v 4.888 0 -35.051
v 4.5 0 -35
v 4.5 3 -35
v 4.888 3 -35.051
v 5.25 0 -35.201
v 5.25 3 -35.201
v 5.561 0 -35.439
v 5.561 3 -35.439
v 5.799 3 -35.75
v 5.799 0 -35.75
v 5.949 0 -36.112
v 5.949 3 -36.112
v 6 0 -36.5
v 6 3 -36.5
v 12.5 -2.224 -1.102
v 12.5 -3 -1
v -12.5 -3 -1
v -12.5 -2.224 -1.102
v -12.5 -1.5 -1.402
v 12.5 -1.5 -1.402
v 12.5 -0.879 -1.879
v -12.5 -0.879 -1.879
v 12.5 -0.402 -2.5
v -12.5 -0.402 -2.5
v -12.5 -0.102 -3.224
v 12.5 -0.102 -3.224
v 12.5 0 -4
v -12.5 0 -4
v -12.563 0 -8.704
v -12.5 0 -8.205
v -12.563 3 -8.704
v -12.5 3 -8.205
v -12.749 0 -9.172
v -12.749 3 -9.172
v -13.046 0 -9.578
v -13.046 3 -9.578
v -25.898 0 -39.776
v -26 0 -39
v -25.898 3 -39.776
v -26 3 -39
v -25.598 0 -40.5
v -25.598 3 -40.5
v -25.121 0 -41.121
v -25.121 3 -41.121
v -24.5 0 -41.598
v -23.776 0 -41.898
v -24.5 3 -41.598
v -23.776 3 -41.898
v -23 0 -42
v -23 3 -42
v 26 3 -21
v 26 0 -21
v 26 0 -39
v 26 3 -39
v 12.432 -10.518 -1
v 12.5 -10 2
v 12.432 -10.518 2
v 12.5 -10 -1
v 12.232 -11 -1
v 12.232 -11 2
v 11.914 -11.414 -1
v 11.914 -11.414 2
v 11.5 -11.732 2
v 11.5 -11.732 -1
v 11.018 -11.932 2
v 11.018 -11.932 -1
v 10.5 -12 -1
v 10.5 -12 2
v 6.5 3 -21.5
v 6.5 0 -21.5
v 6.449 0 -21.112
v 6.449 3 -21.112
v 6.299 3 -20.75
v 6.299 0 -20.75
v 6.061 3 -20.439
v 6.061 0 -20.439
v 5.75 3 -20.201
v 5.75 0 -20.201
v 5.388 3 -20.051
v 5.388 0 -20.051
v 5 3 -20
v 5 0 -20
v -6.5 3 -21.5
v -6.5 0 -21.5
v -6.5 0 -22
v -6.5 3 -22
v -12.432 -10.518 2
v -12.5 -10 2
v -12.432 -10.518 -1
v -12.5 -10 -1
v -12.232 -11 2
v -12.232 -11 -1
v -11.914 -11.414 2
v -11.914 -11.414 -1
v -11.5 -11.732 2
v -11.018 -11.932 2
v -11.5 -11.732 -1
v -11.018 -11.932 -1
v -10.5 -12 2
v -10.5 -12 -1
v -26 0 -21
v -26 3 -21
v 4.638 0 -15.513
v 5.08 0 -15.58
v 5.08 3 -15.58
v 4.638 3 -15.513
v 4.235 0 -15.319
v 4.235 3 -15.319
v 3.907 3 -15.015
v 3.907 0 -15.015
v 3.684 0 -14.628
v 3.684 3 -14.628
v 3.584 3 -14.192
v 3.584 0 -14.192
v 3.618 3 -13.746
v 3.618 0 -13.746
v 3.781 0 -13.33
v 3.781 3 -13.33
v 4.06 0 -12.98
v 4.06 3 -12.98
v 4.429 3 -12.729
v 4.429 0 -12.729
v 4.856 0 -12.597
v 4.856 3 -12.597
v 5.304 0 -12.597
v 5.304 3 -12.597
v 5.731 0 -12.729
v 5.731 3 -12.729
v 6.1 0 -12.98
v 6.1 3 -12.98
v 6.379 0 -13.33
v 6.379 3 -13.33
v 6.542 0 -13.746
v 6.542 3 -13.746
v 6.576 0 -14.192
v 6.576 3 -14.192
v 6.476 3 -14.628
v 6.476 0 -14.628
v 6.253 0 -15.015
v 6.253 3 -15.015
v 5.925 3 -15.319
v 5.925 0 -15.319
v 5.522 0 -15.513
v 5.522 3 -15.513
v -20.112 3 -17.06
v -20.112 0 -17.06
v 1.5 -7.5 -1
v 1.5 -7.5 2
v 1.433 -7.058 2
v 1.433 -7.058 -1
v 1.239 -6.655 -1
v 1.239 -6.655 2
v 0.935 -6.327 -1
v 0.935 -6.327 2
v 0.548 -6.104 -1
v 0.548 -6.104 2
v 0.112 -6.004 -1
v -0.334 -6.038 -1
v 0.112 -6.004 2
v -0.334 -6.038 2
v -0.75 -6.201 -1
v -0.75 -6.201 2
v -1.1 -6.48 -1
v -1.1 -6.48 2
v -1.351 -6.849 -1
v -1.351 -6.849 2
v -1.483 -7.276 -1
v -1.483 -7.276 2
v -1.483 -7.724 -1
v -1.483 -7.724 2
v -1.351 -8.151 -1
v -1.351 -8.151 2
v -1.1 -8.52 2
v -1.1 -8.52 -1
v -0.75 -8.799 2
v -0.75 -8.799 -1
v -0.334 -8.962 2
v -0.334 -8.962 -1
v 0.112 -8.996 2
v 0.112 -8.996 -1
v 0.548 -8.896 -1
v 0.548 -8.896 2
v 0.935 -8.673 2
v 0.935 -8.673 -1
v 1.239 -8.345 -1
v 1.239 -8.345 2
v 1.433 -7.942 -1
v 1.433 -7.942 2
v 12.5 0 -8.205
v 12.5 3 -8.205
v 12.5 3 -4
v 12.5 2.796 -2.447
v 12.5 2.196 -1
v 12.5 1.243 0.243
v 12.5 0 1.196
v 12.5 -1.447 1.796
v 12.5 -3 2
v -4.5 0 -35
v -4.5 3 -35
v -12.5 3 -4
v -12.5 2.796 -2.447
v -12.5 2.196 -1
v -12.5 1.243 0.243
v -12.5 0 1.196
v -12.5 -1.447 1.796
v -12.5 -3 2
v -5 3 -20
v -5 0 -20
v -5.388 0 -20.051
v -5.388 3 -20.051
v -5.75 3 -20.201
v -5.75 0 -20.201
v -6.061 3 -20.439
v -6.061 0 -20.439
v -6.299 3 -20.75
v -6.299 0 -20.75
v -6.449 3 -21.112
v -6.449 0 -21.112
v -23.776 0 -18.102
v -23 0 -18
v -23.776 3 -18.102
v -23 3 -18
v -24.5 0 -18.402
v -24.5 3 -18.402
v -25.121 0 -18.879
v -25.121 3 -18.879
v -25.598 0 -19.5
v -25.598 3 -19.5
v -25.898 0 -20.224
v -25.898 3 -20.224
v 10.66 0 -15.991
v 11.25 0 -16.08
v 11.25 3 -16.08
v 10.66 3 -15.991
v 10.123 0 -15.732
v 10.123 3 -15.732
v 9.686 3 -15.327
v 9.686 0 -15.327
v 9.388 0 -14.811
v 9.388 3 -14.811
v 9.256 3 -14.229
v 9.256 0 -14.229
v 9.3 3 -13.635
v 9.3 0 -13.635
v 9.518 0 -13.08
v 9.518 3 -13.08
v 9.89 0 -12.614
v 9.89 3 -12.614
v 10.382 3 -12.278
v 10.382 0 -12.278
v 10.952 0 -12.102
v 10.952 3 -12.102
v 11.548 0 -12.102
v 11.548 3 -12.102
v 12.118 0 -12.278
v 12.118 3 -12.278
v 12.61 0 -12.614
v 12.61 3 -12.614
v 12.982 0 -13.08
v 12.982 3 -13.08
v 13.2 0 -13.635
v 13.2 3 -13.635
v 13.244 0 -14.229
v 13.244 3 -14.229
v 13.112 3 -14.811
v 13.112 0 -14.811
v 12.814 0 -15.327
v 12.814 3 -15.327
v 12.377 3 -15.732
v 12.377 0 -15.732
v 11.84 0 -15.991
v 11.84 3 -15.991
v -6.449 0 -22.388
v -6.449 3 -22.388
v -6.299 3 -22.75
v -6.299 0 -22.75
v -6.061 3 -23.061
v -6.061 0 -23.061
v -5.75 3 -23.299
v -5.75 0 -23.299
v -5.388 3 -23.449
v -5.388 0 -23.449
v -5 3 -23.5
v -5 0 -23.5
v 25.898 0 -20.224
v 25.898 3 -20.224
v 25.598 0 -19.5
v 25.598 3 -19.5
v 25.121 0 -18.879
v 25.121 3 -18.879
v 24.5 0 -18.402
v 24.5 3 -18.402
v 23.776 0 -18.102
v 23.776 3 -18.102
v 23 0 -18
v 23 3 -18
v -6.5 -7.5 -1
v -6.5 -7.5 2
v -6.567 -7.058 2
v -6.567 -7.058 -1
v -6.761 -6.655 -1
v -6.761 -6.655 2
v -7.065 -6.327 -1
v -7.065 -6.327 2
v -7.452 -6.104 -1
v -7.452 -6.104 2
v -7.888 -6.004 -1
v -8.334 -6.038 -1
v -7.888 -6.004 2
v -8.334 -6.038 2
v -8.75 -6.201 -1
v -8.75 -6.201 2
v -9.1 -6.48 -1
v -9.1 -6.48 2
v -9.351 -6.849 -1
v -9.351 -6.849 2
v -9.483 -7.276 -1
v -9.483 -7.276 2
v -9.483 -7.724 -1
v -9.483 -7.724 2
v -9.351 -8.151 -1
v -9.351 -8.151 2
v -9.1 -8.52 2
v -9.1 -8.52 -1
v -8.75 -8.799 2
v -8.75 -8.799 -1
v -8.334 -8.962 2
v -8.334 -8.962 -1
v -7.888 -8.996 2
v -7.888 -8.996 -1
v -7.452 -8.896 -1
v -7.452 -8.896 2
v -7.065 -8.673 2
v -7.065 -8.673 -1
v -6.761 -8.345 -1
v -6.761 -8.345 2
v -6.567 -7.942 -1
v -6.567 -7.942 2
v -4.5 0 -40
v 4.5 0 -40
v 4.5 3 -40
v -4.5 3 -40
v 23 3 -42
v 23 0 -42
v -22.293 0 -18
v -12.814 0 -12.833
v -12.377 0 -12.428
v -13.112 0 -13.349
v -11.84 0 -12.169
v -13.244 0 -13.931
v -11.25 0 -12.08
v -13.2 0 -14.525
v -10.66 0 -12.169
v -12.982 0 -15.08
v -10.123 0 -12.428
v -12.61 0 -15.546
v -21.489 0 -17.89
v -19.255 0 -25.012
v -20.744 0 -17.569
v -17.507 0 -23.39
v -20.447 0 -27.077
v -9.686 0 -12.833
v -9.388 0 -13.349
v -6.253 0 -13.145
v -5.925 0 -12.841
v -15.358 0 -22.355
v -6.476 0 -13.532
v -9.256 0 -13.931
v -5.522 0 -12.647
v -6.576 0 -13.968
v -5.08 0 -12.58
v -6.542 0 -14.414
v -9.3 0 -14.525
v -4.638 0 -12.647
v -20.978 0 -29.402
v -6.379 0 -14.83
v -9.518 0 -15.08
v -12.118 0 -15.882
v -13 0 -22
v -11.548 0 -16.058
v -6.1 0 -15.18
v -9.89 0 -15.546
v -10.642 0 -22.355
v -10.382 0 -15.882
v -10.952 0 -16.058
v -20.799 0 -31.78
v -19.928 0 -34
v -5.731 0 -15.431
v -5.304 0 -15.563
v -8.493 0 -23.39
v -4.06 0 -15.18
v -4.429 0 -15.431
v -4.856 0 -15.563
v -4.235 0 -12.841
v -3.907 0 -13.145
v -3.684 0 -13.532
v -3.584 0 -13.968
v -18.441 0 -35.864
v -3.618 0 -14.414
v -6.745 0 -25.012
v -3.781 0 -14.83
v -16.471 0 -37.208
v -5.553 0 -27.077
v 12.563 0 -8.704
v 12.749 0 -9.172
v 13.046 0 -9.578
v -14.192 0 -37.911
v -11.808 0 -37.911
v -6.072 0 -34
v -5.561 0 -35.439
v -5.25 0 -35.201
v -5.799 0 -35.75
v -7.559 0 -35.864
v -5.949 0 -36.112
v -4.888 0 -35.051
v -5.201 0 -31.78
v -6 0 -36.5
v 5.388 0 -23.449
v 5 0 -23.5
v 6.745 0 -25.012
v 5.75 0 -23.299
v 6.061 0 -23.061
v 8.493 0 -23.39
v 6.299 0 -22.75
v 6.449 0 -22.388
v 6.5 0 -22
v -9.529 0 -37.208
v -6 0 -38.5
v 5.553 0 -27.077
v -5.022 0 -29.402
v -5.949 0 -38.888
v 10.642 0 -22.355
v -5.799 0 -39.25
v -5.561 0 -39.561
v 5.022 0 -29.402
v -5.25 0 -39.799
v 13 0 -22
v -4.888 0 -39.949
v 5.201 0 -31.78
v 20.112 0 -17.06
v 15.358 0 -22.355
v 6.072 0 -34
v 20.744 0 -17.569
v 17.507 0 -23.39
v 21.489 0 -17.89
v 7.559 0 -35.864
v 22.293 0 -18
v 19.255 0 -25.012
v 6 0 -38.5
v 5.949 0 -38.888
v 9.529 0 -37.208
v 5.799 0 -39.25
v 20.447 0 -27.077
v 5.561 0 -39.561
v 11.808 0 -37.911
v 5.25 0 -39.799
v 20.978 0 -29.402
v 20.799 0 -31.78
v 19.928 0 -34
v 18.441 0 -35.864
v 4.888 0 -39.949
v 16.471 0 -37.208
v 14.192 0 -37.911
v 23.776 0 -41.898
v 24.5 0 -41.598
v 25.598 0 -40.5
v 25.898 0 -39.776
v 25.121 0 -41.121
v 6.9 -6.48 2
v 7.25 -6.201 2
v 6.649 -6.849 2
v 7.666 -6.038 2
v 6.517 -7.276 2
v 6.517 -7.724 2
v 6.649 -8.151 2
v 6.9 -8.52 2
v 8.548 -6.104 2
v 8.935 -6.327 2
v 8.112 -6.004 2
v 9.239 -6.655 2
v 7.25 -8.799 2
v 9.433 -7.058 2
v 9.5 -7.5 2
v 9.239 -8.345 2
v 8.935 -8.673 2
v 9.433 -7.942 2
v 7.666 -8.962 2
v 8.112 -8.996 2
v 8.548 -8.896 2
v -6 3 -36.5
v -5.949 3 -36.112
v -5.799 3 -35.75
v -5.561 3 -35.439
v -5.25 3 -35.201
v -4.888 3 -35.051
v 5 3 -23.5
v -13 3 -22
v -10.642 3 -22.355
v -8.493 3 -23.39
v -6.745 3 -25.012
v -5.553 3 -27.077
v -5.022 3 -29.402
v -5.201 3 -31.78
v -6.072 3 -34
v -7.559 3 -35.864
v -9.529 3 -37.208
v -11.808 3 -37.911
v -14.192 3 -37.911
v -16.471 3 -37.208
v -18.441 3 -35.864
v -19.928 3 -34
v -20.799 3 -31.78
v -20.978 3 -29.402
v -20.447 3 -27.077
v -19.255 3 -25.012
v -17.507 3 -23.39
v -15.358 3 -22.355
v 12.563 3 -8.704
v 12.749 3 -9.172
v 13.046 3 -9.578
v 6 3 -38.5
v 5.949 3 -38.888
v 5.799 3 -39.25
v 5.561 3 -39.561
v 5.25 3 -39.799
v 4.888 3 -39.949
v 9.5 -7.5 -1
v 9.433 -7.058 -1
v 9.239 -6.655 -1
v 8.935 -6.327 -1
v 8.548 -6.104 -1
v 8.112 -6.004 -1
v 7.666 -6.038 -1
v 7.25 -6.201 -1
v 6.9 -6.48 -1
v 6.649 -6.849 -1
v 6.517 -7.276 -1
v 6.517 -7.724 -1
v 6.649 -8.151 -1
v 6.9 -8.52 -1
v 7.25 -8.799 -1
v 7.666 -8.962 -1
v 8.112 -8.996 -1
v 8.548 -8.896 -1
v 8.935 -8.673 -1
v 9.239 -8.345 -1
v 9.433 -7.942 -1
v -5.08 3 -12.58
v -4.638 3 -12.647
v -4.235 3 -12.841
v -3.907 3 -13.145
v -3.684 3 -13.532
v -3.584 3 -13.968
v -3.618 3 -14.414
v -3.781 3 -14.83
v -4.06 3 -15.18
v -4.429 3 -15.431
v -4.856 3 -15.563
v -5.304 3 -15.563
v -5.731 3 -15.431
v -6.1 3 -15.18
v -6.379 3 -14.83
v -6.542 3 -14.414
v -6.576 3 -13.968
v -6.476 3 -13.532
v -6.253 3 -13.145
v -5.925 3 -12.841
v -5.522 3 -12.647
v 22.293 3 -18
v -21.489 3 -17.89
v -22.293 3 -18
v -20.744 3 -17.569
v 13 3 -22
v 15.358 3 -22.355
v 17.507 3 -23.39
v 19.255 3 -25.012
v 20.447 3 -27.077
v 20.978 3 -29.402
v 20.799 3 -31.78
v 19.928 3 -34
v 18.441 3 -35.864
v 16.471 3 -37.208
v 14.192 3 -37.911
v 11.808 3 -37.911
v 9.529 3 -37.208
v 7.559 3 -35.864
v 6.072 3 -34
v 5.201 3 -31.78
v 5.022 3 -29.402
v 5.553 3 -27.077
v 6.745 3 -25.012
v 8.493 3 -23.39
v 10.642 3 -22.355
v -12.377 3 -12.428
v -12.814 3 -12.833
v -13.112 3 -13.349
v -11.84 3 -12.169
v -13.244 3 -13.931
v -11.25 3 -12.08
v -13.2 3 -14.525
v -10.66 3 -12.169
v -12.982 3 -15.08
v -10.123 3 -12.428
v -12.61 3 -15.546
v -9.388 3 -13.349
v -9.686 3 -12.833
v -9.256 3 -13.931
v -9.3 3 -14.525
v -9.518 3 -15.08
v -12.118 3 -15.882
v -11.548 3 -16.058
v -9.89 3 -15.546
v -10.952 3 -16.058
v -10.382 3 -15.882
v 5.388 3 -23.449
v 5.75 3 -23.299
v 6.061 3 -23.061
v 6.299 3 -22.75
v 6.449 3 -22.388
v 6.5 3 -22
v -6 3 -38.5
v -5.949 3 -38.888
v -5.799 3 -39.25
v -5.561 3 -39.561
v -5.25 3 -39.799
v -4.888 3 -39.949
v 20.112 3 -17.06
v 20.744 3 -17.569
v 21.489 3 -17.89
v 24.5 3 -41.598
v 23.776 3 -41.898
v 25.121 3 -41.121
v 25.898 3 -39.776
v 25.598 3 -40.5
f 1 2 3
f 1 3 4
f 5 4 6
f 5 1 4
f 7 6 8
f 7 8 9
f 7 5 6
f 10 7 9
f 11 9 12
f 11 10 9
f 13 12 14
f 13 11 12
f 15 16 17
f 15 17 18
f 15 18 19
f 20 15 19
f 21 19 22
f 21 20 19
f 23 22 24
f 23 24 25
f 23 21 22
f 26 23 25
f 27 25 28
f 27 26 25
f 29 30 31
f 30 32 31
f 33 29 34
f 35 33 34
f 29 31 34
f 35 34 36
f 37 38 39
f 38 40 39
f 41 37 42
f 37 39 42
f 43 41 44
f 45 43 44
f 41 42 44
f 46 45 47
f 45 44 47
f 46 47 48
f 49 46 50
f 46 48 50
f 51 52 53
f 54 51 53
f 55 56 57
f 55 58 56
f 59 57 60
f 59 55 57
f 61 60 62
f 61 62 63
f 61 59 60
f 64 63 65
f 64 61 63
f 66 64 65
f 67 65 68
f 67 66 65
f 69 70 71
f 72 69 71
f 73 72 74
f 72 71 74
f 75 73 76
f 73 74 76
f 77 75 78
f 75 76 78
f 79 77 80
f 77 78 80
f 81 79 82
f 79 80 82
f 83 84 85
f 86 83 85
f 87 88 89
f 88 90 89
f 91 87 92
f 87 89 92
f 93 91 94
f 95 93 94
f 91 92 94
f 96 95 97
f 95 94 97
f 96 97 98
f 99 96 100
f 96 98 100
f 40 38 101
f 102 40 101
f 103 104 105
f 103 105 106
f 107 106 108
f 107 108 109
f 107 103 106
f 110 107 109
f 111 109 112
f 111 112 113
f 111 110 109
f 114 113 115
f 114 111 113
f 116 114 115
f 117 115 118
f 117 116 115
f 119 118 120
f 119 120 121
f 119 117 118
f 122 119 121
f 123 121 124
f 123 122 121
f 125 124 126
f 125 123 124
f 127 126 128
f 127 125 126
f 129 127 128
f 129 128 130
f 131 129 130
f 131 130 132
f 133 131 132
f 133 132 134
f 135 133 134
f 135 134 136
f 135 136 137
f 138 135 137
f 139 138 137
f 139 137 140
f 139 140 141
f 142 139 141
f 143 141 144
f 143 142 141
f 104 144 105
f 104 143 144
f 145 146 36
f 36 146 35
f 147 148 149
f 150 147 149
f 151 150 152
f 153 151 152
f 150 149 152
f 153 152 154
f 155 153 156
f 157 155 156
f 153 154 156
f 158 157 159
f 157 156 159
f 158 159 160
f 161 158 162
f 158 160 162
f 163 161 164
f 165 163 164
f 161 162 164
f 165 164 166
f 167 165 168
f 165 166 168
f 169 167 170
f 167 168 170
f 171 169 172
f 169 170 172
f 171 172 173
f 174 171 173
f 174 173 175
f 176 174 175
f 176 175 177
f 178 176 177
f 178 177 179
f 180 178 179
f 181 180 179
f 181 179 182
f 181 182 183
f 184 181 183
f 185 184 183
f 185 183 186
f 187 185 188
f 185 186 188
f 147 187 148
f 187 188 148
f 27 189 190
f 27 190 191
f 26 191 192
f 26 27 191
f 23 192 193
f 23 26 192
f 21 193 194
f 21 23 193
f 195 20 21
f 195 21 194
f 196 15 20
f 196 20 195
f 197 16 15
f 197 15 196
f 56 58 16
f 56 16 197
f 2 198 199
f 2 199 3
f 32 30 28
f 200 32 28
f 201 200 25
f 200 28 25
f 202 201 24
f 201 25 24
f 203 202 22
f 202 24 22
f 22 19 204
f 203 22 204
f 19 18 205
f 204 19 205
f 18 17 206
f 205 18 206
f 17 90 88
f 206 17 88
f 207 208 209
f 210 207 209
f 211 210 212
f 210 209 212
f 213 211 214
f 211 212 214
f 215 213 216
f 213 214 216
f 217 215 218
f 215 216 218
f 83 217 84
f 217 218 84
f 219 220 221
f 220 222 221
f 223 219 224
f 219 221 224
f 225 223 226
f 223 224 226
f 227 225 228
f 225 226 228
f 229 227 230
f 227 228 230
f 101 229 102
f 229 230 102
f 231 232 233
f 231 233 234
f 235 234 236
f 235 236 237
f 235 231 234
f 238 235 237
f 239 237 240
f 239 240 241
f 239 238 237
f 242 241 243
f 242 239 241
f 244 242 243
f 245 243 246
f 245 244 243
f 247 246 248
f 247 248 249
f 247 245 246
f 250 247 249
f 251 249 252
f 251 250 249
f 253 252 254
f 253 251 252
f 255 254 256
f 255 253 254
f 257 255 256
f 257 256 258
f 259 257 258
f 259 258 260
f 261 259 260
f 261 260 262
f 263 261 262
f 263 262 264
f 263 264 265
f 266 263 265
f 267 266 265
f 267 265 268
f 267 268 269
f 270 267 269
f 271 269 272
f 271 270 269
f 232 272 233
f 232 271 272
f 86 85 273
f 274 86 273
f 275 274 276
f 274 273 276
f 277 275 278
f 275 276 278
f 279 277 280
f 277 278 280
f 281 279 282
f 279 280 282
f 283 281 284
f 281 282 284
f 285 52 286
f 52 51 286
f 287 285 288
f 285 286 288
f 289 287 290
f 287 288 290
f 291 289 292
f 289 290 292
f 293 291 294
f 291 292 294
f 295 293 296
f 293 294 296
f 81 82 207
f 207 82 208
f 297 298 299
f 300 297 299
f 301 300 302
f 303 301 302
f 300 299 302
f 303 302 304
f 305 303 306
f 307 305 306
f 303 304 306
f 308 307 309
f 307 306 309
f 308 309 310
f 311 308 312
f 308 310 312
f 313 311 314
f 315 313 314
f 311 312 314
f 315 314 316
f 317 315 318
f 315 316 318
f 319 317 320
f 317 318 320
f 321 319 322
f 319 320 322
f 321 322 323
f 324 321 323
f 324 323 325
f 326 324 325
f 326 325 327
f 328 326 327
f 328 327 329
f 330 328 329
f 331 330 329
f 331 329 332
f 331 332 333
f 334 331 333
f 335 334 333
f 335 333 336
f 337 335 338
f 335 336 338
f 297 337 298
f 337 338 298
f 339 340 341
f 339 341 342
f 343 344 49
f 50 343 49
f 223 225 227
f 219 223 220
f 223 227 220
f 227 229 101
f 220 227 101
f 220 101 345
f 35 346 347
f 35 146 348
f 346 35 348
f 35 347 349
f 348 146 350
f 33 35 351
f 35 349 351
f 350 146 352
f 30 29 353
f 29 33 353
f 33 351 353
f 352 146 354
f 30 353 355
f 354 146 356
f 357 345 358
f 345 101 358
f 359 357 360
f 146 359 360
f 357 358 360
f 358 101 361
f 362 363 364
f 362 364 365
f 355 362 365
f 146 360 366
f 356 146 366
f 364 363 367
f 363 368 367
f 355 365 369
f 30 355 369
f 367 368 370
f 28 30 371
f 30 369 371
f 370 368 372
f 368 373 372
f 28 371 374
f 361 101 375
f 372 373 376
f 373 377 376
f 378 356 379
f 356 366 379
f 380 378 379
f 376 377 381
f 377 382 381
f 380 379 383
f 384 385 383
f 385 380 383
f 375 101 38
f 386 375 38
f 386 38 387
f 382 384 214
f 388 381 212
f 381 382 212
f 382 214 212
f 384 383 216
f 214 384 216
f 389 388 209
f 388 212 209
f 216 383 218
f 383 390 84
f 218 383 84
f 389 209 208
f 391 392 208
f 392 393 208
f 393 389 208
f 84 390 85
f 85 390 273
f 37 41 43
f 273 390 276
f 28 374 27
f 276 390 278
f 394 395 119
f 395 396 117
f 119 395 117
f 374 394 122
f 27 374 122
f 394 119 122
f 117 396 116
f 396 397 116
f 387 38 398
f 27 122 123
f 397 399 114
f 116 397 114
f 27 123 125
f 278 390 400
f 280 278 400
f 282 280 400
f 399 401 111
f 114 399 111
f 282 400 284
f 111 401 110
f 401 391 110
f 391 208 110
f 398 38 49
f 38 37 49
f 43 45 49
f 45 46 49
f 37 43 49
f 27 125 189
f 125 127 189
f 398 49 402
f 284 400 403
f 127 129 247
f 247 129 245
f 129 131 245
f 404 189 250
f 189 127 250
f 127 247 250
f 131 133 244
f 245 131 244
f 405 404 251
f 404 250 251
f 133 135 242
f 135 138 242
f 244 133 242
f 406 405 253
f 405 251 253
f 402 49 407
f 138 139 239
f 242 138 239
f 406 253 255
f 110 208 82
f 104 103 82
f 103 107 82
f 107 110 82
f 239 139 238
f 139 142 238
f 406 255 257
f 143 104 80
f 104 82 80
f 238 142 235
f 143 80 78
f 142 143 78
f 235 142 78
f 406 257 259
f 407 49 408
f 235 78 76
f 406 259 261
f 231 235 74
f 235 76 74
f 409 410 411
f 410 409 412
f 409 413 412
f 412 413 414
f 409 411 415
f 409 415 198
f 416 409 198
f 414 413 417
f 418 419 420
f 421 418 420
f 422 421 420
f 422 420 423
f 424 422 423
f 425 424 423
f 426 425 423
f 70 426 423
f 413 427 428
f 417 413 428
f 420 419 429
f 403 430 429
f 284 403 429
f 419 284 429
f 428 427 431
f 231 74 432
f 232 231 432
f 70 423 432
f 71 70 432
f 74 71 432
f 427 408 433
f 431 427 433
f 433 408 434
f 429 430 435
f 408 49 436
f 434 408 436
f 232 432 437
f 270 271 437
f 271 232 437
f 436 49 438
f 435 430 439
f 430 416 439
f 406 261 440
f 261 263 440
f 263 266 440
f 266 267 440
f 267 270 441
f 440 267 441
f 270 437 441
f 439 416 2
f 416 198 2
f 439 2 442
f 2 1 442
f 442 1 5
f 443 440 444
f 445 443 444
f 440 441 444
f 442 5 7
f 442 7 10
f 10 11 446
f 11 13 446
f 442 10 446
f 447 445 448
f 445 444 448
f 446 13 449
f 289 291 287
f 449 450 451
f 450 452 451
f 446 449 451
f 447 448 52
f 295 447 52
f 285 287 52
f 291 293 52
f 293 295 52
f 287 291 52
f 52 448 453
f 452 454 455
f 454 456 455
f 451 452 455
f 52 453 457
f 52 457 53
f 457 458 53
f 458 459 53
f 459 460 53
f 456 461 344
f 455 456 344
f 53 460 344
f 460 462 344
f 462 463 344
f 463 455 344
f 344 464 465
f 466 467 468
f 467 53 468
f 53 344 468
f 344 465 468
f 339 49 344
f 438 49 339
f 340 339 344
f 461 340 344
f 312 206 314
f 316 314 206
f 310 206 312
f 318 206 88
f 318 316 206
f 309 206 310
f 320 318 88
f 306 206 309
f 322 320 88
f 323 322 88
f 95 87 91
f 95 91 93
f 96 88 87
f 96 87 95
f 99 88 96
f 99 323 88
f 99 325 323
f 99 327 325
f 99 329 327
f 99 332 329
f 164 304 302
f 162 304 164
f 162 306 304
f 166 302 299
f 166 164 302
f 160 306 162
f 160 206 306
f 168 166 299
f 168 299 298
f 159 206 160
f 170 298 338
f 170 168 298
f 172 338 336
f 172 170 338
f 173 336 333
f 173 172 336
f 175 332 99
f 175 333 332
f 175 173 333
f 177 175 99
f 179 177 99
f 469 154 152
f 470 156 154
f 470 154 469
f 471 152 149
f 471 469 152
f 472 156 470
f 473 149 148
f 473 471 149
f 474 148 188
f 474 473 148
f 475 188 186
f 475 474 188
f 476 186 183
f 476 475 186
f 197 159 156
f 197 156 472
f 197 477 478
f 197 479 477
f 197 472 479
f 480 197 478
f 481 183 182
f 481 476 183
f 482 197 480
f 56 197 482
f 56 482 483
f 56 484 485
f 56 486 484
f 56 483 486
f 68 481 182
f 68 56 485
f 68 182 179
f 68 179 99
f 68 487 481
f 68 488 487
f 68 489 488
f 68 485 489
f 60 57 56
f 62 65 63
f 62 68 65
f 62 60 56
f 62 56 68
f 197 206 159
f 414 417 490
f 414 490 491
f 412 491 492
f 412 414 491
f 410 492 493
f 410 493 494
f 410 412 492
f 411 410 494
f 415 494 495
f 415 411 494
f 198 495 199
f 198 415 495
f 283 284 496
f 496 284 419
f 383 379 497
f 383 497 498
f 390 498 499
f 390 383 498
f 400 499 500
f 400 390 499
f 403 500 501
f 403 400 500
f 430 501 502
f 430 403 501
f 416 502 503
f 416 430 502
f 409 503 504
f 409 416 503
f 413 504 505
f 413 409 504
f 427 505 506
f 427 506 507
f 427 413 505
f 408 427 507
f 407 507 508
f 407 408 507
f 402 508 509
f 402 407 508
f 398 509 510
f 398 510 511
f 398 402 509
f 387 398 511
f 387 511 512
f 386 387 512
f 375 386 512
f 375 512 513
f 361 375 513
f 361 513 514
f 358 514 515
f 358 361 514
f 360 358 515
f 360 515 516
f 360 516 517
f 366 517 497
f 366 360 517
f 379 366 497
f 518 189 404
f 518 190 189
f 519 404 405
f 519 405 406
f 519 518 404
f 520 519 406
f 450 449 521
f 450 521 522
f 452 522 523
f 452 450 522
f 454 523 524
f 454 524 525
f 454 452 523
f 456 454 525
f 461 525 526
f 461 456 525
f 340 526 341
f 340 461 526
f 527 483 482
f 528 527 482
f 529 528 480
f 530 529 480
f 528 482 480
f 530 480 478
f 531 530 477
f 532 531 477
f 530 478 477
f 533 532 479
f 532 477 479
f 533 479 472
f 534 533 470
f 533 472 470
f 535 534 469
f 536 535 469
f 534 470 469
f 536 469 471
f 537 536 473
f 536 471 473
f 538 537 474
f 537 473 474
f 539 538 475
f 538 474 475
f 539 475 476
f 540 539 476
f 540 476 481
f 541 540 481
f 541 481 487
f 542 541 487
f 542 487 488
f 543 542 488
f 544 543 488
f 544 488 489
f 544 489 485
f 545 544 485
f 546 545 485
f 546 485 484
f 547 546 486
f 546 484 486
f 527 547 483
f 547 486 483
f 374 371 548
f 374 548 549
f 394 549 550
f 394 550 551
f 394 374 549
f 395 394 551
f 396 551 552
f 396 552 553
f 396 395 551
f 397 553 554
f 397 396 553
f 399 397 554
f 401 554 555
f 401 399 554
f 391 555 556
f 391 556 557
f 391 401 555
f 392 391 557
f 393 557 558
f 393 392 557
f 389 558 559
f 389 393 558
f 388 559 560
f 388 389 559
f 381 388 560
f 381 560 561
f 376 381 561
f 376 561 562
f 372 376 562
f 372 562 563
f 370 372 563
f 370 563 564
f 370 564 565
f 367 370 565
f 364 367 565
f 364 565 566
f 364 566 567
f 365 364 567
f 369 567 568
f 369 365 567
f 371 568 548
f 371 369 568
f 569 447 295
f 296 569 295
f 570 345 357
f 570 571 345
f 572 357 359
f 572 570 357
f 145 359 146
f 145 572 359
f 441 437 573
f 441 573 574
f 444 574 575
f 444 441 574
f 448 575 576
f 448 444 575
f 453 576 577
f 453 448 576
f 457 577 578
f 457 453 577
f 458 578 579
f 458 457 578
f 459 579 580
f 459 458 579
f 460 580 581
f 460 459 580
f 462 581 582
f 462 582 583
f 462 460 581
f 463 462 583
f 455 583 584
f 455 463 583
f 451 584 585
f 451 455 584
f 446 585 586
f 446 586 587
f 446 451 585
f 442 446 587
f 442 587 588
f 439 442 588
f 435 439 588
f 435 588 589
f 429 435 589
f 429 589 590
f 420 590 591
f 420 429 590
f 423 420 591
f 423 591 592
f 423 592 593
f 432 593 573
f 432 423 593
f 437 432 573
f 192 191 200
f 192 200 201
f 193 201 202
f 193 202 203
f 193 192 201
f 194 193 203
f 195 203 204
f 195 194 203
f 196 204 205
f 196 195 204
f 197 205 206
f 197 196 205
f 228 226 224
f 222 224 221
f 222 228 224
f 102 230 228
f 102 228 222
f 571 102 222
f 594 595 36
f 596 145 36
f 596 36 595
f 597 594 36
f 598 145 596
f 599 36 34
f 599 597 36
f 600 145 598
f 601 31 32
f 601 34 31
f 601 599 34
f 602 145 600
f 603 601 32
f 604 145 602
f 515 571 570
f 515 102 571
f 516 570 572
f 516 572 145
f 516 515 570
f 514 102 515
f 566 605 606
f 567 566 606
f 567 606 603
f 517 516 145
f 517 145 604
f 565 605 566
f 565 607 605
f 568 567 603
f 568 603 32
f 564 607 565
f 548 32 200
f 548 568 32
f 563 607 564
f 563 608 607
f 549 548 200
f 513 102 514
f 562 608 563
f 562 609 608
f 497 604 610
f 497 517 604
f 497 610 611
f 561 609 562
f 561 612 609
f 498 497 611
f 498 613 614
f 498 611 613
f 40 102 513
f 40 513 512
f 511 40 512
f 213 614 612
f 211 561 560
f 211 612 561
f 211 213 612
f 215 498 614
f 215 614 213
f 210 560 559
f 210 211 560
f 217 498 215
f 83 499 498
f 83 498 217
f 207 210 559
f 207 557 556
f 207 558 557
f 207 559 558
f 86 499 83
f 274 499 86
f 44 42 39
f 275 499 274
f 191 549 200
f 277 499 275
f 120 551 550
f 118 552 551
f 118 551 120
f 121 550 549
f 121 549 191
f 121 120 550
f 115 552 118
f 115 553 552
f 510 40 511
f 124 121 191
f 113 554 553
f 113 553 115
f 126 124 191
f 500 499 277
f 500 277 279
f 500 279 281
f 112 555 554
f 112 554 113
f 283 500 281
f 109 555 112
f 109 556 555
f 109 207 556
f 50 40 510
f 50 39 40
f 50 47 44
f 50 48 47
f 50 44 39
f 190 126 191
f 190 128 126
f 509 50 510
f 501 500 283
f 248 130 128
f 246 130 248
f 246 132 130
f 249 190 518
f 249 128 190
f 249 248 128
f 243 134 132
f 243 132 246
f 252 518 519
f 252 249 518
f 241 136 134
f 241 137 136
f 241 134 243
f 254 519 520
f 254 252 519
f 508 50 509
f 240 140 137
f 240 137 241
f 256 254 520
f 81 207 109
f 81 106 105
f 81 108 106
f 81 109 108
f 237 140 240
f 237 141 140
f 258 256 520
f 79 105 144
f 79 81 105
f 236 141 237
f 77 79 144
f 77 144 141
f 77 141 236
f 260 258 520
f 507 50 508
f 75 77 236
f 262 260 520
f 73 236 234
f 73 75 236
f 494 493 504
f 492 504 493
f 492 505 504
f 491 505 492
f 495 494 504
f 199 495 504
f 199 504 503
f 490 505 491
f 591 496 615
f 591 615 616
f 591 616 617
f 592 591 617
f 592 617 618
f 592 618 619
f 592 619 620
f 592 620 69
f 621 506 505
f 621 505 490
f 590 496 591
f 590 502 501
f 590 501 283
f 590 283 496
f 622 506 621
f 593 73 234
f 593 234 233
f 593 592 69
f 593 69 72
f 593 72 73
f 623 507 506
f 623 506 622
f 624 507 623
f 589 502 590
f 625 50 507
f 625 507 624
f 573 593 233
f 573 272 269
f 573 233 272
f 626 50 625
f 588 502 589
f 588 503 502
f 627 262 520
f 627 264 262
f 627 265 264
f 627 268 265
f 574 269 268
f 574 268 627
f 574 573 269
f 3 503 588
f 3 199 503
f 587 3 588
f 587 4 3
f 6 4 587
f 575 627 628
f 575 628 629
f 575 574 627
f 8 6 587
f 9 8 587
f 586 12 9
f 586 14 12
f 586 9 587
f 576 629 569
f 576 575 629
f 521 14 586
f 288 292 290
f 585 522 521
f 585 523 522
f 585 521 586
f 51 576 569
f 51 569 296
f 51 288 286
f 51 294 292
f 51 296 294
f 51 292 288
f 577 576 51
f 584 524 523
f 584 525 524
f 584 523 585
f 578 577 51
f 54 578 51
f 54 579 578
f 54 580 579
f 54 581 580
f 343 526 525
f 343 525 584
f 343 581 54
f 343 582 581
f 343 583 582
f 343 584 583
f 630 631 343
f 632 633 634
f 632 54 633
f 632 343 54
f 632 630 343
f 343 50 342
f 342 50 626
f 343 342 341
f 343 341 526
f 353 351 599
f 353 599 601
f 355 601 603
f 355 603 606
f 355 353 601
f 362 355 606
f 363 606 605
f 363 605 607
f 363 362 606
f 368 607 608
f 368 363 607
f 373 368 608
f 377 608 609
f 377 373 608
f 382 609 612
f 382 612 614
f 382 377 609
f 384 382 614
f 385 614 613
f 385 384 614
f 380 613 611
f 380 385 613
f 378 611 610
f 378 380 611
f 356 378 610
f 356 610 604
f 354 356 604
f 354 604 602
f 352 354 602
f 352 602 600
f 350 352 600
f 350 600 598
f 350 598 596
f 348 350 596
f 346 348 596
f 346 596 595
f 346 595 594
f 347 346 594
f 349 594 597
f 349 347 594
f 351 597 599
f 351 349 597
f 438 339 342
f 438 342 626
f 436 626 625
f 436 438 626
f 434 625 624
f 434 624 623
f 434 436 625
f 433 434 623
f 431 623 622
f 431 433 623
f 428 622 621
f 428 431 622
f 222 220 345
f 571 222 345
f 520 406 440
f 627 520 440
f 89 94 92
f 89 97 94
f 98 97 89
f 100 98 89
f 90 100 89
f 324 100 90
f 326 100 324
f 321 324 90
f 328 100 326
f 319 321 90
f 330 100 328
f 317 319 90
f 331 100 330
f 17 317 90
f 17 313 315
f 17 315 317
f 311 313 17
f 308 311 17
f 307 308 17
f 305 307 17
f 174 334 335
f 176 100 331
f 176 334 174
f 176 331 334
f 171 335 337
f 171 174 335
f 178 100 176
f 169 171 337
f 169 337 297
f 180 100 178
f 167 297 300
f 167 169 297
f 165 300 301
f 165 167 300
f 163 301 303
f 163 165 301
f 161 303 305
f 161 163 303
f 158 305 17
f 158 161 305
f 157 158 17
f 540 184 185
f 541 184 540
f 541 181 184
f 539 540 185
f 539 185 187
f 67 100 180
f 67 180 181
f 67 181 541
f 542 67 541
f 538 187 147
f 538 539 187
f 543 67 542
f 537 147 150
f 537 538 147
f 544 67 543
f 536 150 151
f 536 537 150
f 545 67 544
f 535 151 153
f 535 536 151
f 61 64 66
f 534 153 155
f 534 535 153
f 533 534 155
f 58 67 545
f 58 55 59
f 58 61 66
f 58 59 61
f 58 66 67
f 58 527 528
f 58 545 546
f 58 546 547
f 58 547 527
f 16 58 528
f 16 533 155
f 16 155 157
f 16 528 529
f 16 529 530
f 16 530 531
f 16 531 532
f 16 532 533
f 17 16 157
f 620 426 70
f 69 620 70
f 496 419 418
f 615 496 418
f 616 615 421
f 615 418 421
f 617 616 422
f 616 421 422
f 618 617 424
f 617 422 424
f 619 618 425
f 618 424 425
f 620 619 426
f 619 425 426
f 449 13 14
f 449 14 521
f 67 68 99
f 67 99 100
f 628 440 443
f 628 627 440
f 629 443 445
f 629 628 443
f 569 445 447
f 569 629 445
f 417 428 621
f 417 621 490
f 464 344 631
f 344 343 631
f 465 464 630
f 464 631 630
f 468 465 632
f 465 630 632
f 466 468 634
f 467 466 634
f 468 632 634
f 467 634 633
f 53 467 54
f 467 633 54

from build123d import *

# Parameters (mm, degrees)
CROQUIS11_R             = 2
CROQUIS11_R_2           = 1.5
CROQUIS11_R_3           = 9
SALIENTE_EXTRUIR1_DEPTH = 3
REDONDEO1_R             = 3
BOSS_EXTRUDE1_START     = -3
SKETCH1_R               = 9
SKETCH1_R_2             = 8
BOSS_EXTRUDE1_DEPTH     = 3
SKETCH2_W               = 25
SKETCH2_H               = 3
BOSS_EXTRUDE2_DEPTH     = 5
EDGE_FLANGE1_DEPTH      = 25
SKETCH10_R              = 1.5
CUT_EXTRUDE1_DEPTH      = 3
FILLET1_R               = 2


# Sheet-metal steps are written as plain solids
with BuildPart() as part:
    # Croquis11 → Saliente-Extruir1 (new body)
    with BuildSketch(Plane(origin=(0, 0, 0), x_dir=(1, 0, 0), z_dir=(0, 1, 0))):
        Polygon((-26, 18), (-21, 18), (-12.5, 9), (12.5, 9), (21, 18), (26, 18), (26, 42), (-26, 42), align=None)
        with Locations(Location((-11.25, 14.08, 0), (0, 0, 270))):
            Circle(CROQUIS11_R, mode=Mode.SUBTRACT)
        with Locations(Location((-5.08, 14.08, 0), (0, 0, 270))):
            Circle(CROQUIS11_R_2, mode=Mode.SUBTRACT)
        with Locations(Location((5.08, 14.08, 0), (0, 0, 90))):
            Circle(CROQUIS11_R_2, mode=Mode.SUBTRACT)
        with Locations(Location((11.25, 14.08, 0), (0, 0, 90))):
            Circle(CROQUIS11_R, mode=Mode.SUBTRACT)
        with Locations(Location((13, 30, 0), (0, 0, 270))):
            Circle(CROQUIS11_R_3, mode=Mode.SUBTRACT)
        with Locations(Location((-13, 30, 0), (0, 0, 270))):
            Circle(CROQUIS11_R_3, mode=Mode.SUBTRACT)
        with BuildLine():
            Line((-6, 38.5), (-6, 36.5))
            ThreePointArc((-6, 36.5), (-5.560660172, 35.439339828), (-4.5, 35))
            Line((-4.5, 35), (4.5, 35))
            ThreePointArc((4.5, 35), (5.560660172, 35.439339828), (6, 36.5))
            Line((6, 36.5), (6, 38.5))
            ThreePointArc((6, 38.5), (5.560660172, 39.560660172), (4.5, 40))
            Line((4.5, 40), (-4.5, 40))
            ThreePointArc((-4.5, 40), (-5.560660172, 39.560660172), (-6, 38.5))
        make_face(mode=Mode.SUBTRACT)
        with BuildLine():
            Line((6.5, 22), (6.5, 21.5))
            ThreePointArc((6.5, 21.5), (6.060660172, 20.439339828), (5, 20))
            Line((5, 20), (-5, 20))
            ThreePointArc((-5, 20), (-6.060660172, 20.439339828), (-6.5, 21.5))
            Line((-6.5, 21.5), (-6.5, 22))
            ThreePointArc((-6.5, 22), (-6.060660172, 23.060660172), (-5, 23.5))
            Line((-5, 23.5), (5, 23.5))
            ThreePointArc((5, 23.5), (6.060660172, 23.060660172), (6.5, 22))
        make_face(mode=Mode.SUBTRACT)
    extrude(amount=SALIENTE_EXTRUIR1_DEPTH)

    # Redondeo1
    redondeo1_edges = [part.edges().sort_by_distance(p)[0] for p in [
        (26, 1.5, -18),
        (21, 1.5, -18),
        (-21, 1.5, -18),
        (-26, 1.5, -18),
        (-26, 1.5, -42),
        (26, 1.5, -42),
    ]]
    fillet(redondeo1_edges, radius=REDONDEO1_R)

    # Sketch1 → Boss-Extrude1 (add)
    # profile 1 of 2: a face of its own
    with BuildSketch(Plane(origin=(0, 3, 0), x_dir=(1, 0, 0), z_dir=(0, 1, 0)).offset(BOSS_EXTRUDE1_START)):
        with Locations((-13, 30)):
            Circle(SKETCH1_R)
        with Locations(Location((-13, 30, 0), (0, 0, 270))):
            Circle(SKETCH1_R_2, mode=Mode.SUBTRACT)
    # profile 2 of 2: a face of its own
    with BuildSketch(Plane(origin=(0, 3, 0), x_dir=(1, 0, 0), z_dir=(0, 1, 0)).offset(BOSS_EXTRUDE1_START)):
        with Locations((13, 30)):
            Circle(SKETCH1_R)
        with Locations(Location((13, 30, 0), (0, 0, 270))):
            Circle(SKETCH1_R_2, mode=Mode.SUBTRACT)
    extrude(amount=BOSS_EXTRUDE1_DEPTH)

    # Sketch2 → Boss-Extrude2 (add)
    with BuildSketch(Plane.XY.offset(-9)):
        with Locations((0, 1.5)):
            Rectangle(SKETCH2_W, SKETCH2_H)
    extrude(amount=BOSS_EXTRUDE2_DEPTH)

    # Edge-Flange1 section (across the edge) → Edge-Flange1 (add)
    with BuildSketch(Plane(origin=(12.5, 0, -1), x_dir=(0, 0, -1), z_dir=(-1, 0, 0))):
        with BuildLine():
            Line((-3, 3), (-3, 12))
            Line((-3, 12), (0, 12))
            Line((0, 12), (0, 3))
            ThreePointArc((0, 3), (0.878679656, 0.878679656), (3, 0))
            Line((3, 0), (3, -3))
            ThreePointArc((3, -3), (-1.242640687, -1.242640687), (-3, 3))
        make_face()
    extrude(amount=EDGE_FLANGE1_DEPTH)

    # Sketch10 → Cut-Extrude1 (cut)
    with BuildSketch(Plane.XY.offset(2)):
        with Locations((0, -7.5)):
            Circle(SKETCH10_R)
        with Locations((-8, -7.5)):
            Circle(SKETCH10_R)
        with Locations((8, -7.5)):
            Circle(SKETCH10_R)
    extrude(amount=-CUT_EXTRUDE1_DEPTH, mode=Mode.SUBTRACT)

    # Fillet1
    fillet1_edges = [part.edges().sort_by_distance(p)[0] for p in [
        (12.5, 1.5, -9),
        (-12.5, 1.5, -9),
        (12.5, -12, 0.5),
        (-12.5, -12, 0.5),
    ]]
    fillet(fillet1_edges, radius=FILLET1_R)


solid = part.part
